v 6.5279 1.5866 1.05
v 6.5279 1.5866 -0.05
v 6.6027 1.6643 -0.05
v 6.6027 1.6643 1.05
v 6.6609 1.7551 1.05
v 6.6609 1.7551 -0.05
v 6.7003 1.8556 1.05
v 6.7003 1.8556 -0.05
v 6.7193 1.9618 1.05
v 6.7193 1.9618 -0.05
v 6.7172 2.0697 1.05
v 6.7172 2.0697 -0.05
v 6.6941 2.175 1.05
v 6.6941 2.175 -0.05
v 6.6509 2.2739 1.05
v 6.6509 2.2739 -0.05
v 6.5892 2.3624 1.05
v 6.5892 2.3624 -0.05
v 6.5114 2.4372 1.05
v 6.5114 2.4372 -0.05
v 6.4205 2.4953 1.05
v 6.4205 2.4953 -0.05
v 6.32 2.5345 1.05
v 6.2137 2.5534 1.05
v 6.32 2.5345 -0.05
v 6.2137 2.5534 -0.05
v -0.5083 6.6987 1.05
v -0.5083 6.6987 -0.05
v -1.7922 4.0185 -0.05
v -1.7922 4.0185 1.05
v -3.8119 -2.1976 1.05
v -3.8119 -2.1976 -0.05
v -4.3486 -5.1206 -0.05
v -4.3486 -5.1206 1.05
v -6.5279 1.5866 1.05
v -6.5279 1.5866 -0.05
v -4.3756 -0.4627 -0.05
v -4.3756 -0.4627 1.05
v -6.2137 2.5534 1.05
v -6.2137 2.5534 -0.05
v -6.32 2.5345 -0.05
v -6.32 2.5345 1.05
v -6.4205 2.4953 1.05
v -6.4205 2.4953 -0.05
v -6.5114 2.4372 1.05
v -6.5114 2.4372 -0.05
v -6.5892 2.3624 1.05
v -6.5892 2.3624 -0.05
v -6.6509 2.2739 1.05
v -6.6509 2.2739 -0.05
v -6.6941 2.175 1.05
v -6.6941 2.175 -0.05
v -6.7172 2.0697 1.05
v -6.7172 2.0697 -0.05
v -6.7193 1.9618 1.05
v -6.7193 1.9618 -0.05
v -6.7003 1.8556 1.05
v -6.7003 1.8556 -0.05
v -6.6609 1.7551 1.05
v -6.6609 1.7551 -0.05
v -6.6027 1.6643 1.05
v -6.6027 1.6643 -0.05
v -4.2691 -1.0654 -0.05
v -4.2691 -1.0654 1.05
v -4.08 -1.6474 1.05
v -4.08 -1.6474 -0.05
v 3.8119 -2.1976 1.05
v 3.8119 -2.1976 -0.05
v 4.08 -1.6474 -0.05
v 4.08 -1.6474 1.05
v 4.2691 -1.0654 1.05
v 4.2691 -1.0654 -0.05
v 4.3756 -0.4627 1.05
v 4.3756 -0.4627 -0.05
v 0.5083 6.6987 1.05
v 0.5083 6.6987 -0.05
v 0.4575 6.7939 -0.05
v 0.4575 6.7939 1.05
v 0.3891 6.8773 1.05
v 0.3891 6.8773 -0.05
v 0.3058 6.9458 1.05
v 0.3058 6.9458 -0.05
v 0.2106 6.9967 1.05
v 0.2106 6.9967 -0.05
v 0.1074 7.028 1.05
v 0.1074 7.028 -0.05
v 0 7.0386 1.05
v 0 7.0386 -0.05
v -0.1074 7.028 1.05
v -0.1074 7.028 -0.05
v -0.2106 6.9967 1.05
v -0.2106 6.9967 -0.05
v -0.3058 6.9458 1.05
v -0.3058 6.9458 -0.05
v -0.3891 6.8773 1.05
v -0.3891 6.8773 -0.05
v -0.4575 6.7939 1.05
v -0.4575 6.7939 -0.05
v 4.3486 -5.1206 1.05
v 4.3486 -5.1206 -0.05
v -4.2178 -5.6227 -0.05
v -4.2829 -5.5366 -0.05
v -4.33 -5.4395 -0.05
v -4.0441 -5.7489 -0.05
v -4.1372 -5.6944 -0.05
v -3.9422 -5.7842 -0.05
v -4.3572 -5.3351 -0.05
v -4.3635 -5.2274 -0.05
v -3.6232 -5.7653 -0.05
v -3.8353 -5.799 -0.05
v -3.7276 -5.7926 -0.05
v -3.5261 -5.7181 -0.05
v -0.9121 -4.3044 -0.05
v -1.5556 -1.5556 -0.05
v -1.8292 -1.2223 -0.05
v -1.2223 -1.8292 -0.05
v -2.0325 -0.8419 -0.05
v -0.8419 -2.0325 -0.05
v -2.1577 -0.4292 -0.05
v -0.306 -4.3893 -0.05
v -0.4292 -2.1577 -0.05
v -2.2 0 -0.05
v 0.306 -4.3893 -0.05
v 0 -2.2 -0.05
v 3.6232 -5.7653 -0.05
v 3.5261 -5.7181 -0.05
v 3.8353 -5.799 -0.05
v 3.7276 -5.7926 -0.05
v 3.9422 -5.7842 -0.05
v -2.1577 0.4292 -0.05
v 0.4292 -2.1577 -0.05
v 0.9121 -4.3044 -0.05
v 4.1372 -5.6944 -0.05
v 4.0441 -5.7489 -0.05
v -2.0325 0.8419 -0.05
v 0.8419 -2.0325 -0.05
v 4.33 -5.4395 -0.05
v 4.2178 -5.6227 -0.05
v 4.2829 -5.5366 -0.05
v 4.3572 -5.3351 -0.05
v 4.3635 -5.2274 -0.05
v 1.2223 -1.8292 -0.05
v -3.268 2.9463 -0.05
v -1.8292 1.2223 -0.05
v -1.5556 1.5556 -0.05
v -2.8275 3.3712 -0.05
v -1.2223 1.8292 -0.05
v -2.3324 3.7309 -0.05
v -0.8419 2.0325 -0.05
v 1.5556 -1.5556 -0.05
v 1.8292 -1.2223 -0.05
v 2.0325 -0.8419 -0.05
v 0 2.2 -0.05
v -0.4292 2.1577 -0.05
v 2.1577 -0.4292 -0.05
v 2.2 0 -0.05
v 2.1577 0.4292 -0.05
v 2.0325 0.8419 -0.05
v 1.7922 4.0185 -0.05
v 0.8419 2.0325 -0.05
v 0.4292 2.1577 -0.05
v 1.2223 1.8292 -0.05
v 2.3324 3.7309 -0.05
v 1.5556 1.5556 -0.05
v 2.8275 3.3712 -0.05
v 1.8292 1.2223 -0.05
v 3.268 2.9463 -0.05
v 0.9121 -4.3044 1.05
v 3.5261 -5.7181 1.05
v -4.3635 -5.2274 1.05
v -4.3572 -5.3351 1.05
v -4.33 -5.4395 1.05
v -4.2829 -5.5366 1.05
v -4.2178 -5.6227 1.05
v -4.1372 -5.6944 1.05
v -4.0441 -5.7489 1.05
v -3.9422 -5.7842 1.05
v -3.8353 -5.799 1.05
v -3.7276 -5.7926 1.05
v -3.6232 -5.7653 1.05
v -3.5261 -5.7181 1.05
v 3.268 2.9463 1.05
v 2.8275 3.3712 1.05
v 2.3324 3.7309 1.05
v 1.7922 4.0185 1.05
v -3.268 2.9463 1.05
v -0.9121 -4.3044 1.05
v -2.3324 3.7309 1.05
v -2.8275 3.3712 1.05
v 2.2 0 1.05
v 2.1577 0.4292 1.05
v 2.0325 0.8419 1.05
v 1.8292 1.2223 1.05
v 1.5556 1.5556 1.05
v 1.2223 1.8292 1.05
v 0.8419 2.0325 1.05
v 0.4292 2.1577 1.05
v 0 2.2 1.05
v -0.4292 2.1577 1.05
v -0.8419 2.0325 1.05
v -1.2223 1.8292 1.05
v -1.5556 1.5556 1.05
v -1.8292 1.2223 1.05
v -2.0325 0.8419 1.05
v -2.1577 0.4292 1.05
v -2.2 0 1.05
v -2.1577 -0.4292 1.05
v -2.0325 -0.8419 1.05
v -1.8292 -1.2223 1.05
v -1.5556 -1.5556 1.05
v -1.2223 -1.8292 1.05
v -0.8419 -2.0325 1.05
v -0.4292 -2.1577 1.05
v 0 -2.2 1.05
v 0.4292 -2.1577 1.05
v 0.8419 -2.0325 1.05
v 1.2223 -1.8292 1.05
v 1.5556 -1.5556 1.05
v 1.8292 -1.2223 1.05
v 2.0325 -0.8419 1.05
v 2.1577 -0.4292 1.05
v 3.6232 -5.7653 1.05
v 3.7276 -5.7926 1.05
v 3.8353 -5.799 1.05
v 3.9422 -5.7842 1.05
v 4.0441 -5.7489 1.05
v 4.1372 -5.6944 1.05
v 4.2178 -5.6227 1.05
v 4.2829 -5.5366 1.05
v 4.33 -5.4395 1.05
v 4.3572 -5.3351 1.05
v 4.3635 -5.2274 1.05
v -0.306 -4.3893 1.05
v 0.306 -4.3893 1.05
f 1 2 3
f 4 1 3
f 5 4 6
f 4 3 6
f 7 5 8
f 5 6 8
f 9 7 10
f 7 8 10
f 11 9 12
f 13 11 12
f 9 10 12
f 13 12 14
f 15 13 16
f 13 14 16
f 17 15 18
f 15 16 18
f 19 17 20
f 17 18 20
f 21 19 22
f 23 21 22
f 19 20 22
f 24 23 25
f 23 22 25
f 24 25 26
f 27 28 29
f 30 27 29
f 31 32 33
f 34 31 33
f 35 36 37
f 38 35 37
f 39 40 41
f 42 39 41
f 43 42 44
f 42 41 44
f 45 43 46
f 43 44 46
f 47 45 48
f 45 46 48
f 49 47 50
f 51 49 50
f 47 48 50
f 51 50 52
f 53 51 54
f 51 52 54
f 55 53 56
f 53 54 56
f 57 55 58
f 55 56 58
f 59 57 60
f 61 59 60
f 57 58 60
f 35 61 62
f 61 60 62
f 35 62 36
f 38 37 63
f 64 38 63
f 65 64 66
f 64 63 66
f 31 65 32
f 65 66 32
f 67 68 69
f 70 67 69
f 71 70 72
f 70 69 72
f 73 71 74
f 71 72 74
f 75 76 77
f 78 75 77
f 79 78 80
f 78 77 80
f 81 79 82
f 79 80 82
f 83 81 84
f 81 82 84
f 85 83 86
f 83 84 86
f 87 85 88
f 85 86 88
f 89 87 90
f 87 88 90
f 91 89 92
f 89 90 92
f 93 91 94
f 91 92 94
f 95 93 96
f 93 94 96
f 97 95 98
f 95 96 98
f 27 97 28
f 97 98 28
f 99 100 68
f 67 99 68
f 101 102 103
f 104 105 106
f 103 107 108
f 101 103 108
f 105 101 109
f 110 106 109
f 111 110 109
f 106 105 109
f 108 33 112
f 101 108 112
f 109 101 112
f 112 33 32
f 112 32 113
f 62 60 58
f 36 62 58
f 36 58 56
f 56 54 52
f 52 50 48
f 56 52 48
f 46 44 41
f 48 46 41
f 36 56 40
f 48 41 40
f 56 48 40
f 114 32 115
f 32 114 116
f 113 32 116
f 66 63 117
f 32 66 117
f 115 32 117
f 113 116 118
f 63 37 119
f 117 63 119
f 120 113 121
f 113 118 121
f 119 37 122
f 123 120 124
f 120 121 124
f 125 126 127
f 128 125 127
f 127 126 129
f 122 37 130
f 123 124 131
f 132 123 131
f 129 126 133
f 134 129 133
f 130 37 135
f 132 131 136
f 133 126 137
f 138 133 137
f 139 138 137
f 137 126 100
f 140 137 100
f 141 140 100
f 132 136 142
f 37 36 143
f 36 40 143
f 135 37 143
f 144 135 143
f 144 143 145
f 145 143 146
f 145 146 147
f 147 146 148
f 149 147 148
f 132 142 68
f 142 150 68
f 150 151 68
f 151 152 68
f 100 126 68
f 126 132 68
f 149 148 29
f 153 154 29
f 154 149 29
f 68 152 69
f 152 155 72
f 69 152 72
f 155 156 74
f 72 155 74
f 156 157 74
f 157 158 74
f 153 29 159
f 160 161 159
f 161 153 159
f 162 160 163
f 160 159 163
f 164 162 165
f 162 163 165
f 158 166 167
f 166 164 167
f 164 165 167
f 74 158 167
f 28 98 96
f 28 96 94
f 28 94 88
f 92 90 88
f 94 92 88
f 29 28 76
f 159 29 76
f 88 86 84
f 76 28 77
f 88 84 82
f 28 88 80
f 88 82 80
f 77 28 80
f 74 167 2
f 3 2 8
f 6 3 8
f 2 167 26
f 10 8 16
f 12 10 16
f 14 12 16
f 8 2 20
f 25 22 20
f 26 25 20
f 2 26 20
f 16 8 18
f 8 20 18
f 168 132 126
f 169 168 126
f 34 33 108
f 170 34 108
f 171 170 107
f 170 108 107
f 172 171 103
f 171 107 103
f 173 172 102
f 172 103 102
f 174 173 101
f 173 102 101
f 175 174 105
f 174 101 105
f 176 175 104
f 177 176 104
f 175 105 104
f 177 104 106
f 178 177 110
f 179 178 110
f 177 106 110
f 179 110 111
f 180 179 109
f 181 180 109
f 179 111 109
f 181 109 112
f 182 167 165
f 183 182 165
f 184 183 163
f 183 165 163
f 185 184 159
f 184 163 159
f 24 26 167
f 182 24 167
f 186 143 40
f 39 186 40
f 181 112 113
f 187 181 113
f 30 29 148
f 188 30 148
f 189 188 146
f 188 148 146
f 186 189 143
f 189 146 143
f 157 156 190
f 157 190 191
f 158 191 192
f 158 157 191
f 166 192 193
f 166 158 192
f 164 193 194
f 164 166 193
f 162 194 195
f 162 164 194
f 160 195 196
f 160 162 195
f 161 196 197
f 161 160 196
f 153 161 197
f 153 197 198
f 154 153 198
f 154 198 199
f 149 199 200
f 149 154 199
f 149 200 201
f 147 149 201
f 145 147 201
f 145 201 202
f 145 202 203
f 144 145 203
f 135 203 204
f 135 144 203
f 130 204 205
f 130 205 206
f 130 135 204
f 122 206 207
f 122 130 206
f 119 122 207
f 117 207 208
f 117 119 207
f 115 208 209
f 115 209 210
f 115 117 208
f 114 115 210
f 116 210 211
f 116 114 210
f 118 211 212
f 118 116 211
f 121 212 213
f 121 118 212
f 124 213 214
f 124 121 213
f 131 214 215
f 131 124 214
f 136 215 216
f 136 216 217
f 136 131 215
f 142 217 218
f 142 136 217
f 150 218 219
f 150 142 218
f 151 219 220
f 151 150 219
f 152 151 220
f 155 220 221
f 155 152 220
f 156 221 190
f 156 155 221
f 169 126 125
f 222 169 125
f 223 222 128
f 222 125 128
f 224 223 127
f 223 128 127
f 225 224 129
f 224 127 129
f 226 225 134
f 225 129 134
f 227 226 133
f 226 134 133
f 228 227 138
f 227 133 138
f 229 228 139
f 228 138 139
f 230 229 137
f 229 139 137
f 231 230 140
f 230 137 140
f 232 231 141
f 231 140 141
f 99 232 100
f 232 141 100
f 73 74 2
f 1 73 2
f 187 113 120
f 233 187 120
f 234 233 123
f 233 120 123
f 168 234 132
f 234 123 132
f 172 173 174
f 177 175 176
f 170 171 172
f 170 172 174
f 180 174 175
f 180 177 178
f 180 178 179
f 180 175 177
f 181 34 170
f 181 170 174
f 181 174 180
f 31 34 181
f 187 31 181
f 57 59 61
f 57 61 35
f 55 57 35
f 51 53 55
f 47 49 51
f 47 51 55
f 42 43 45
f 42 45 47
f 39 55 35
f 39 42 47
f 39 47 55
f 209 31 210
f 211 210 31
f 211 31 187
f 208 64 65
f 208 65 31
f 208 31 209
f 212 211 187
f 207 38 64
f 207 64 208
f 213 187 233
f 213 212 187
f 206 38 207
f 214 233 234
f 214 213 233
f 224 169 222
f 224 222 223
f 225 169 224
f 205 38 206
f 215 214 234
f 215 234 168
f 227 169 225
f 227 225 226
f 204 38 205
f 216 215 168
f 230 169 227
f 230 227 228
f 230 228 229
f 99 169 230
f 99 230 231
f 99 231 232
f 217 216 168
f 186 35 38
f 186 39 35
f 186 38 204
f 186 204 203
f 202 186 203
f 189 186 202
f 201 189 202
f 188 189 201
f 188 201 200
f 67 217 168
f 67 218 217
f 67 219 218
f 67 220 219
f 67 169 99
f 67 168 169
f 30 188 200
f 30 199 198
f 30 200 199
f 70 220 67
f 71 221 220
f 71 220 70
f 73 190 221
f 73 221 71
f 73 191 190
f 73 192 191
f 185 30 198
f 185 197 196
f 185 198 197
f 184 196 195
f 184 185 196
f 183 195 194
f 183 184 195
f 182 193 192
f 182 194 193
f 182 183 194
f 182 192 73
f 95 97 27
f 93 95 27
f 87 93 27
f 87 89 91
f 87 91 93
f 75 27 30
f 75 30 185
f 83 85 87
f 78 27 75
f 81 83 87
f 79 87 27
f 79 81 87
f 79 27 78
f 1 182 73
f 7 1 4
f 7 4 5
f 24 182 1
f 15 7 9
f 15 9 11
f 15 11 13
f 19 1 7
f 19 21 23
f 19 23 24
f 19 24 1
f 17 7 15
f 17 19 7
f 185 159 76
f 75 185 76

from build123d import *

# Parameters (mm, degrees)
SKETCH1_R           = 2
BOSS_EXTRUDE1_DEPTH = 1
SCALE1_SCALE        = 1.1


with BuildPart() as part:
    # Sketch1 → Boss-Extrude1 (new body)
    with BuildSketch(Plane.XY):
        with BuildLine():
            Line((-0.462098351, 6.089690496), (-1.629279619, 3.653142199))
            ThreePointArc((-1.629279619, 3.653142199), (-2.351141009, 3.236067977), (-2.970869602, 2.67842002))
            Line((-2.970869602, 2.67842002), (-5.648843585, 2.321299502))
            ThreePointArc((-5.648843585, 2.321299502), (-6.085555848, 1.977316958), (-5.934436072, 1.442336206))
            Line((-5.934436072, 1.442336206), (-3.977819784, -0.420653976))
            ThreePointArc((-3.977819784, -0.420653976), (-3.804226065, -1.236067977), (-3.465378009, -1.99778759))
            Line((-3.465378009, -1.99778759), (-3.953275684, -4.655048506))
            ThreePointArc((-3.953275684, -4.655048506), (-3.761080354, -5.176683001), (-3.205584845, -5.198277698))
            Line((-3.205584845, -5.198277698), (-0.829148209, -3.913120653))
            ThreePointArc((-0.829148209, -3.913120653), (0, -4), (0.829148209, -3.913120653))
            Line((0.829148209, -3.913120653), (3.205584845, -5.198277698))
            ThreePointArc((3.205584845, -5.198277698), (3.761080354, -5.176683001), (3.953275684, -4.655048506))
            Line((3.953275684, -4.655048506), (3.465378009, -1.99778759))
            ThreePointArc((3.465378009, -1.99778759), (3.804226065, -1.236067977), (3.977819784, -0.420653976))
            Line((3.977819784, -0.420653976), (5.934436072, 1.442336206))
            ThreePointArc((5.934436072, 1.442336206), (6.085555848, 1.977316958), (5.648843585, 2.321299502))
            Line((5.648843585, 2.321299502), (2.970869602, 2.67842002))
            ThreePointArc((2.970869602, 2.67842002), (2.351141009, 3.236067977), (1.629279619, 3.653142199))
            Line((1.629279619, 3.653142199), (0.462098351, 6.089690496))
            ThreePointArc((0.462098351, 6.089690496), (0, 6.398732088), (-0.462098351, 6.089690496))
        make_face()
        Circle(SKETCH1_R, mode=Mode.SUBTRACT)
    extrude(amount=BOSS_EXTRUDE1_DEPTH)


with BuildPart() as part_1:
    # Scale1: scaled about (0, 0, 0.5)
    add(part.part.scale(SCALE1_SCALE).moved(Location((0, 0, -0.05))))


solid = part_1.part
